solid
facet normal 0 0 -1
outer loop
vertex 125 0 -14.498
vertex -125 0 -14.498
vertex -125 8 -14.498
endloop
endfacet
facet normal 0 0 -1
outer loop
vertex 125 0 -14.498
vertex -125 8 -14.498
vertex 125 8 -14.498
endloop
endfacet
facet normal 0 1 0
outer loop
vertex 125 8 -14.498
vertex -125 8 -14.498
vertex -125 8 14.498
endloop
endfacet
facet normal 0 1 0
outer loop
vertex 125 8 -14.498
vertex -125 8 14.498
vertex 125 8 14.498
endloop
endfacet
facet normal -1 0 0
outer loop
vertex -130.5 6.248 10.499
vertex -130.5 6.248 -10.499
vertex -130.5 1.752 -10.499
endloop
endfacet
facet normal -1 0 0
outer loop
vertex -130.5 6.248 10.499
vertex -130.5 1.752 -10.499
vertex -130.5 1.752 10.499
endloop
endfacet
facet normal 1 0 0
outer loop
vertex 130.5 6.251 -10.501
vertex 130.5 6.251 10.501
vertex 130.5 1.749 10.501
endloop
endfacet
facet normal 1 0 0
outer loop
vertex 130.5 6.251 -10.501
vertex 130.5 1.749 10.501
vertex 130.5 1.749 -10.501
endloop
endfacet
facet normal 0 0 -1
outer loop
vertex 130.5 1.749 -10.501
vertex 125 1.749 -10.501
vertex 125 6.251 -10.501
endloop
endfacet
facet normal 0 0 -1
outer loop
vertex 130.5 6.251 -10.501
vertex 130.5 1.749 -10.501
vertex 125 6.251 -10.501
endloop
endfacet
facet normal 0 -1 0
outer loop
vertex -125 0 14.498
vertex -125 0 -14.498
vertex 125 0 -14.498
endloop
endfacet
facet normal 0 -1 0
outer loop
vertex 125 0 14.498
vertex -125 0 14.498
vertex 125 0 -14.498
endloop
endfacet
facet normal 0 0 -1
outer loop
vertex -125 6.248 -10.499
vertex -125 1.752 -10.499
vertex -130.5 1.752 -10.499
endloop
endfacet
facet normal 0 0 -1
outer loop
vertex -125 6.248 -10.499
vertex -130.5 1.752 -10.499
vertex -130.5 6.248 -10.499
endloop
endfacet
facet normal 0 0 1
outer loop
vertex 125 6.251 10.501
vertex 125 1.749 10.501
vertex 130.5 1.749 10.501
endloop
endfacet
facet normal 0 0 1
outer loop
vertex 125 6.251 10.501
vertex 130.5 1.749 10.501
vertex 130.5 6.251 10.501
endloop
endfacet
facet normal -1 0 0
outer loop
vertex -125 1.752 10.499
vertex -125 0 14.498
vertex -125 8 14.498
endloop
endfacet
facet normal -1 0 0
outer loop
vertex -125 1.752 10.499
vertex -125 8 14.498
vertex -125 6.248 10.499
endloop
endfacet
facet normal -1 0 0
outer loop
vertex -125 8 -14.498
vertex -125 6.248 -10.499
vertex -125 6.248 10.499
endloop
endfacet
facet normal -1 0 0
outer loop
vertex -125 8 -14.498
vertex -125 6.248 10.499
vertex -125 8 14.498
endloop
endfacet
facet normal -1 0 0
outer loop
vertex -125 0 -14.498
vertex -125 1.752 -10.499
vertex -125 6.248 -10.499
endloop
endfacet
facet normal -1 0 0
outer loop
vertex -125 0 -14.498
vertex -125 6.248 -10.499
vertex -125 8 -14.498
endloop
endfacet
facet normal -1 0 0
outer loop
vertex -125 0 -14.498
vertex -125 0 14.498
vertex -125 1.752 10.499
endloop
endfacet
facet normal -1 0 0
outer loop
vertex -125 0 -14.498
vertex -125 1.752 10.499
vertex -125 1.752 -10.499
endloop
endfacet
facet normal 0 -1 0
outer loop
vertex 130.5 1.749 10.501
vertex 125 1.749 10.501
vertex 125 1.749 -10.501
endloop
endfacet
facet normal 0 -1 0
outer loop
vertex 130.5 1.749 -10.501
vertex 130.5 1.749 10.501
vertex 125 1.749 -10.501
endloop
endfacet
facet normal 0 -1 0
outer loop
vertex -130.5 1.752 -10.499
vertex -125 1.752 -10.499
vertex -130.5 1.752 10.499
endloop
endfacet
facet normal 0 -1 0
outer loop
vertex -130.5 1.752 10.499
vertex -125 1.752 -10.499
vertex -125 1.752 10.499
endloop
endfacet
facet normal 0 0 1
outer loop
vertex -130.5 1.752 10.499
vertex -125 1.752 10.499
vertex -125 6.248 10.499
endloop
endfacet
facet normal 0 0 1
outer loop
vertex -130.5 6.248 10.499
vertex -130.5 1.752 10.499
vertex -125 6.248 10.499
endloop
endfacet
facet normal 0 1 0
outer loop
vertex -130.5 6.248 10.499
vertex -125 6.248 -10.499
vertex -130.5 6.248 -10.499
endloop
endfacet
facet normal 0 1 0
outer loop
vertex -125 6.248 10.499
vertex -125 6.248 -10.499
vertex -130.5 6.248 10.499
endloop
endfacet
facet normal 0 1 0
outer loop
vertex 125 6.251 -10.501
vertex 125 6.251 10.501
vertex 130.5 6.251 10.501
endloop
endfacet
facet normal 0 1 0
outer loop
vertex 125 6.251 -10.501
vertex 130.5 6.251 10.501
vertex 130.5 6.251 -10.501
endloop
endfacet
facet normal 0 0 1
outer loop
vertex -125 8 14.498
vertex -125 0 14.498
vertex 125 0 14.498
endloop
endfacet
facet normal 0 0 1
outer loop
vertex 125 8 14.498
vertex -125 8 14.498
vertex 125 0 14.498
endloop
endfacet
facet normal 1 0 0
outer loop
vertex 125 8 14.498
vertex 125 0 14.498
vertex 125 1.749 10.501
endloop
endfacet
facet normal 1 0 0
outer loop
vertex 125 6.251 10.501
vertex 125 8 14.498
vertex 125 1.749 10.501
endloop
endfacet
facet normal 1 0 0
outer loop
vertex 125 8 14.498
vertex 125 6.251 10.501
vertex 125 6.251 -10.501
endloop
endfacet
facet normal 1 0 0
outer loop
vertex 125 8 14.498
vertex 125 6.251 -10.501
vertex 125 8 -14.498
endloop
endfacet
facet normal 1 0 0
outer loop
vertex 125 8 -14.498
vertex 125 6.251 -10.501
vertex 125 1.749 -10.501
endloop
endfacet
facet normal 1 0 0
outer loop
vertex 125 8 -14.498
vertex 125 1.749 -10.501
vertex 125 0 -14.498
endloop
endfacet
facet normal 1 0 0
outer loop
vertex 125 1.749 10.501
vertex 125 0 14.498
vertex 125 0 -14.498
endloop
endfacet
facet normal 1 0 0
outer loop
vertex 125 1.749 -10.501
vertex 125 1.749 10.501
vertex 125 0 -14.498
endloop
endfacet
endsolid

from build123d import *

# Parameters (mm, degrees)
SKETCH_1_W      = 250
SKETCH_1_H      = 28.996988848
EXTRUDE_1_DEPTH = 8
SKETCH_2_W      = 21.001828318
SKETCH_2_H      = 4.50112507
EXTRUDE_2_DEPTH = 5.5
SKETCH_3_W      = 20.998493162
SKETCH_3_H      = 4.496055774
EXTRUDE_3_DEPTH = 5.5


with BuildPart() as part:
    # Эскиз1 → Бобышка-Вытянуть1 (new body)
    with BuildSketch(Plane(origin=(0, 0, 0), x_dir=(1, 0, 0), z_dir=(0, 1, 0))):
        Rectangle(SKETCH_1_W, SKETCH_1_H)
    extrude(amount=EXTRUDE_1_DEPTH)

    # Эскиз2 → Бобышка-Вытянуть2 (add)
    with BuildSketch(Plane(origin=(125, 0, 0), x_dir=(0, 0, -1), z_dir=(1, 0, 0))):
        with Locations((0, 4)):
            Rectangle(SKETCH_2_W, SKETCH_2_H)
    extrude(amount=EXTRUDE_2_DEPTH)

    # Эскиз3 → Бобышка-Вытянуть3 (add)
    with BuildSketch(Plane.ZY.offset(125)):
        with Locations((0, 4)):
            Rectangle(SKETCH_3_W, SKETCH_3_H)
    extrude(amount=EXTRUDE_3_DEPTH)


solid = part.part
